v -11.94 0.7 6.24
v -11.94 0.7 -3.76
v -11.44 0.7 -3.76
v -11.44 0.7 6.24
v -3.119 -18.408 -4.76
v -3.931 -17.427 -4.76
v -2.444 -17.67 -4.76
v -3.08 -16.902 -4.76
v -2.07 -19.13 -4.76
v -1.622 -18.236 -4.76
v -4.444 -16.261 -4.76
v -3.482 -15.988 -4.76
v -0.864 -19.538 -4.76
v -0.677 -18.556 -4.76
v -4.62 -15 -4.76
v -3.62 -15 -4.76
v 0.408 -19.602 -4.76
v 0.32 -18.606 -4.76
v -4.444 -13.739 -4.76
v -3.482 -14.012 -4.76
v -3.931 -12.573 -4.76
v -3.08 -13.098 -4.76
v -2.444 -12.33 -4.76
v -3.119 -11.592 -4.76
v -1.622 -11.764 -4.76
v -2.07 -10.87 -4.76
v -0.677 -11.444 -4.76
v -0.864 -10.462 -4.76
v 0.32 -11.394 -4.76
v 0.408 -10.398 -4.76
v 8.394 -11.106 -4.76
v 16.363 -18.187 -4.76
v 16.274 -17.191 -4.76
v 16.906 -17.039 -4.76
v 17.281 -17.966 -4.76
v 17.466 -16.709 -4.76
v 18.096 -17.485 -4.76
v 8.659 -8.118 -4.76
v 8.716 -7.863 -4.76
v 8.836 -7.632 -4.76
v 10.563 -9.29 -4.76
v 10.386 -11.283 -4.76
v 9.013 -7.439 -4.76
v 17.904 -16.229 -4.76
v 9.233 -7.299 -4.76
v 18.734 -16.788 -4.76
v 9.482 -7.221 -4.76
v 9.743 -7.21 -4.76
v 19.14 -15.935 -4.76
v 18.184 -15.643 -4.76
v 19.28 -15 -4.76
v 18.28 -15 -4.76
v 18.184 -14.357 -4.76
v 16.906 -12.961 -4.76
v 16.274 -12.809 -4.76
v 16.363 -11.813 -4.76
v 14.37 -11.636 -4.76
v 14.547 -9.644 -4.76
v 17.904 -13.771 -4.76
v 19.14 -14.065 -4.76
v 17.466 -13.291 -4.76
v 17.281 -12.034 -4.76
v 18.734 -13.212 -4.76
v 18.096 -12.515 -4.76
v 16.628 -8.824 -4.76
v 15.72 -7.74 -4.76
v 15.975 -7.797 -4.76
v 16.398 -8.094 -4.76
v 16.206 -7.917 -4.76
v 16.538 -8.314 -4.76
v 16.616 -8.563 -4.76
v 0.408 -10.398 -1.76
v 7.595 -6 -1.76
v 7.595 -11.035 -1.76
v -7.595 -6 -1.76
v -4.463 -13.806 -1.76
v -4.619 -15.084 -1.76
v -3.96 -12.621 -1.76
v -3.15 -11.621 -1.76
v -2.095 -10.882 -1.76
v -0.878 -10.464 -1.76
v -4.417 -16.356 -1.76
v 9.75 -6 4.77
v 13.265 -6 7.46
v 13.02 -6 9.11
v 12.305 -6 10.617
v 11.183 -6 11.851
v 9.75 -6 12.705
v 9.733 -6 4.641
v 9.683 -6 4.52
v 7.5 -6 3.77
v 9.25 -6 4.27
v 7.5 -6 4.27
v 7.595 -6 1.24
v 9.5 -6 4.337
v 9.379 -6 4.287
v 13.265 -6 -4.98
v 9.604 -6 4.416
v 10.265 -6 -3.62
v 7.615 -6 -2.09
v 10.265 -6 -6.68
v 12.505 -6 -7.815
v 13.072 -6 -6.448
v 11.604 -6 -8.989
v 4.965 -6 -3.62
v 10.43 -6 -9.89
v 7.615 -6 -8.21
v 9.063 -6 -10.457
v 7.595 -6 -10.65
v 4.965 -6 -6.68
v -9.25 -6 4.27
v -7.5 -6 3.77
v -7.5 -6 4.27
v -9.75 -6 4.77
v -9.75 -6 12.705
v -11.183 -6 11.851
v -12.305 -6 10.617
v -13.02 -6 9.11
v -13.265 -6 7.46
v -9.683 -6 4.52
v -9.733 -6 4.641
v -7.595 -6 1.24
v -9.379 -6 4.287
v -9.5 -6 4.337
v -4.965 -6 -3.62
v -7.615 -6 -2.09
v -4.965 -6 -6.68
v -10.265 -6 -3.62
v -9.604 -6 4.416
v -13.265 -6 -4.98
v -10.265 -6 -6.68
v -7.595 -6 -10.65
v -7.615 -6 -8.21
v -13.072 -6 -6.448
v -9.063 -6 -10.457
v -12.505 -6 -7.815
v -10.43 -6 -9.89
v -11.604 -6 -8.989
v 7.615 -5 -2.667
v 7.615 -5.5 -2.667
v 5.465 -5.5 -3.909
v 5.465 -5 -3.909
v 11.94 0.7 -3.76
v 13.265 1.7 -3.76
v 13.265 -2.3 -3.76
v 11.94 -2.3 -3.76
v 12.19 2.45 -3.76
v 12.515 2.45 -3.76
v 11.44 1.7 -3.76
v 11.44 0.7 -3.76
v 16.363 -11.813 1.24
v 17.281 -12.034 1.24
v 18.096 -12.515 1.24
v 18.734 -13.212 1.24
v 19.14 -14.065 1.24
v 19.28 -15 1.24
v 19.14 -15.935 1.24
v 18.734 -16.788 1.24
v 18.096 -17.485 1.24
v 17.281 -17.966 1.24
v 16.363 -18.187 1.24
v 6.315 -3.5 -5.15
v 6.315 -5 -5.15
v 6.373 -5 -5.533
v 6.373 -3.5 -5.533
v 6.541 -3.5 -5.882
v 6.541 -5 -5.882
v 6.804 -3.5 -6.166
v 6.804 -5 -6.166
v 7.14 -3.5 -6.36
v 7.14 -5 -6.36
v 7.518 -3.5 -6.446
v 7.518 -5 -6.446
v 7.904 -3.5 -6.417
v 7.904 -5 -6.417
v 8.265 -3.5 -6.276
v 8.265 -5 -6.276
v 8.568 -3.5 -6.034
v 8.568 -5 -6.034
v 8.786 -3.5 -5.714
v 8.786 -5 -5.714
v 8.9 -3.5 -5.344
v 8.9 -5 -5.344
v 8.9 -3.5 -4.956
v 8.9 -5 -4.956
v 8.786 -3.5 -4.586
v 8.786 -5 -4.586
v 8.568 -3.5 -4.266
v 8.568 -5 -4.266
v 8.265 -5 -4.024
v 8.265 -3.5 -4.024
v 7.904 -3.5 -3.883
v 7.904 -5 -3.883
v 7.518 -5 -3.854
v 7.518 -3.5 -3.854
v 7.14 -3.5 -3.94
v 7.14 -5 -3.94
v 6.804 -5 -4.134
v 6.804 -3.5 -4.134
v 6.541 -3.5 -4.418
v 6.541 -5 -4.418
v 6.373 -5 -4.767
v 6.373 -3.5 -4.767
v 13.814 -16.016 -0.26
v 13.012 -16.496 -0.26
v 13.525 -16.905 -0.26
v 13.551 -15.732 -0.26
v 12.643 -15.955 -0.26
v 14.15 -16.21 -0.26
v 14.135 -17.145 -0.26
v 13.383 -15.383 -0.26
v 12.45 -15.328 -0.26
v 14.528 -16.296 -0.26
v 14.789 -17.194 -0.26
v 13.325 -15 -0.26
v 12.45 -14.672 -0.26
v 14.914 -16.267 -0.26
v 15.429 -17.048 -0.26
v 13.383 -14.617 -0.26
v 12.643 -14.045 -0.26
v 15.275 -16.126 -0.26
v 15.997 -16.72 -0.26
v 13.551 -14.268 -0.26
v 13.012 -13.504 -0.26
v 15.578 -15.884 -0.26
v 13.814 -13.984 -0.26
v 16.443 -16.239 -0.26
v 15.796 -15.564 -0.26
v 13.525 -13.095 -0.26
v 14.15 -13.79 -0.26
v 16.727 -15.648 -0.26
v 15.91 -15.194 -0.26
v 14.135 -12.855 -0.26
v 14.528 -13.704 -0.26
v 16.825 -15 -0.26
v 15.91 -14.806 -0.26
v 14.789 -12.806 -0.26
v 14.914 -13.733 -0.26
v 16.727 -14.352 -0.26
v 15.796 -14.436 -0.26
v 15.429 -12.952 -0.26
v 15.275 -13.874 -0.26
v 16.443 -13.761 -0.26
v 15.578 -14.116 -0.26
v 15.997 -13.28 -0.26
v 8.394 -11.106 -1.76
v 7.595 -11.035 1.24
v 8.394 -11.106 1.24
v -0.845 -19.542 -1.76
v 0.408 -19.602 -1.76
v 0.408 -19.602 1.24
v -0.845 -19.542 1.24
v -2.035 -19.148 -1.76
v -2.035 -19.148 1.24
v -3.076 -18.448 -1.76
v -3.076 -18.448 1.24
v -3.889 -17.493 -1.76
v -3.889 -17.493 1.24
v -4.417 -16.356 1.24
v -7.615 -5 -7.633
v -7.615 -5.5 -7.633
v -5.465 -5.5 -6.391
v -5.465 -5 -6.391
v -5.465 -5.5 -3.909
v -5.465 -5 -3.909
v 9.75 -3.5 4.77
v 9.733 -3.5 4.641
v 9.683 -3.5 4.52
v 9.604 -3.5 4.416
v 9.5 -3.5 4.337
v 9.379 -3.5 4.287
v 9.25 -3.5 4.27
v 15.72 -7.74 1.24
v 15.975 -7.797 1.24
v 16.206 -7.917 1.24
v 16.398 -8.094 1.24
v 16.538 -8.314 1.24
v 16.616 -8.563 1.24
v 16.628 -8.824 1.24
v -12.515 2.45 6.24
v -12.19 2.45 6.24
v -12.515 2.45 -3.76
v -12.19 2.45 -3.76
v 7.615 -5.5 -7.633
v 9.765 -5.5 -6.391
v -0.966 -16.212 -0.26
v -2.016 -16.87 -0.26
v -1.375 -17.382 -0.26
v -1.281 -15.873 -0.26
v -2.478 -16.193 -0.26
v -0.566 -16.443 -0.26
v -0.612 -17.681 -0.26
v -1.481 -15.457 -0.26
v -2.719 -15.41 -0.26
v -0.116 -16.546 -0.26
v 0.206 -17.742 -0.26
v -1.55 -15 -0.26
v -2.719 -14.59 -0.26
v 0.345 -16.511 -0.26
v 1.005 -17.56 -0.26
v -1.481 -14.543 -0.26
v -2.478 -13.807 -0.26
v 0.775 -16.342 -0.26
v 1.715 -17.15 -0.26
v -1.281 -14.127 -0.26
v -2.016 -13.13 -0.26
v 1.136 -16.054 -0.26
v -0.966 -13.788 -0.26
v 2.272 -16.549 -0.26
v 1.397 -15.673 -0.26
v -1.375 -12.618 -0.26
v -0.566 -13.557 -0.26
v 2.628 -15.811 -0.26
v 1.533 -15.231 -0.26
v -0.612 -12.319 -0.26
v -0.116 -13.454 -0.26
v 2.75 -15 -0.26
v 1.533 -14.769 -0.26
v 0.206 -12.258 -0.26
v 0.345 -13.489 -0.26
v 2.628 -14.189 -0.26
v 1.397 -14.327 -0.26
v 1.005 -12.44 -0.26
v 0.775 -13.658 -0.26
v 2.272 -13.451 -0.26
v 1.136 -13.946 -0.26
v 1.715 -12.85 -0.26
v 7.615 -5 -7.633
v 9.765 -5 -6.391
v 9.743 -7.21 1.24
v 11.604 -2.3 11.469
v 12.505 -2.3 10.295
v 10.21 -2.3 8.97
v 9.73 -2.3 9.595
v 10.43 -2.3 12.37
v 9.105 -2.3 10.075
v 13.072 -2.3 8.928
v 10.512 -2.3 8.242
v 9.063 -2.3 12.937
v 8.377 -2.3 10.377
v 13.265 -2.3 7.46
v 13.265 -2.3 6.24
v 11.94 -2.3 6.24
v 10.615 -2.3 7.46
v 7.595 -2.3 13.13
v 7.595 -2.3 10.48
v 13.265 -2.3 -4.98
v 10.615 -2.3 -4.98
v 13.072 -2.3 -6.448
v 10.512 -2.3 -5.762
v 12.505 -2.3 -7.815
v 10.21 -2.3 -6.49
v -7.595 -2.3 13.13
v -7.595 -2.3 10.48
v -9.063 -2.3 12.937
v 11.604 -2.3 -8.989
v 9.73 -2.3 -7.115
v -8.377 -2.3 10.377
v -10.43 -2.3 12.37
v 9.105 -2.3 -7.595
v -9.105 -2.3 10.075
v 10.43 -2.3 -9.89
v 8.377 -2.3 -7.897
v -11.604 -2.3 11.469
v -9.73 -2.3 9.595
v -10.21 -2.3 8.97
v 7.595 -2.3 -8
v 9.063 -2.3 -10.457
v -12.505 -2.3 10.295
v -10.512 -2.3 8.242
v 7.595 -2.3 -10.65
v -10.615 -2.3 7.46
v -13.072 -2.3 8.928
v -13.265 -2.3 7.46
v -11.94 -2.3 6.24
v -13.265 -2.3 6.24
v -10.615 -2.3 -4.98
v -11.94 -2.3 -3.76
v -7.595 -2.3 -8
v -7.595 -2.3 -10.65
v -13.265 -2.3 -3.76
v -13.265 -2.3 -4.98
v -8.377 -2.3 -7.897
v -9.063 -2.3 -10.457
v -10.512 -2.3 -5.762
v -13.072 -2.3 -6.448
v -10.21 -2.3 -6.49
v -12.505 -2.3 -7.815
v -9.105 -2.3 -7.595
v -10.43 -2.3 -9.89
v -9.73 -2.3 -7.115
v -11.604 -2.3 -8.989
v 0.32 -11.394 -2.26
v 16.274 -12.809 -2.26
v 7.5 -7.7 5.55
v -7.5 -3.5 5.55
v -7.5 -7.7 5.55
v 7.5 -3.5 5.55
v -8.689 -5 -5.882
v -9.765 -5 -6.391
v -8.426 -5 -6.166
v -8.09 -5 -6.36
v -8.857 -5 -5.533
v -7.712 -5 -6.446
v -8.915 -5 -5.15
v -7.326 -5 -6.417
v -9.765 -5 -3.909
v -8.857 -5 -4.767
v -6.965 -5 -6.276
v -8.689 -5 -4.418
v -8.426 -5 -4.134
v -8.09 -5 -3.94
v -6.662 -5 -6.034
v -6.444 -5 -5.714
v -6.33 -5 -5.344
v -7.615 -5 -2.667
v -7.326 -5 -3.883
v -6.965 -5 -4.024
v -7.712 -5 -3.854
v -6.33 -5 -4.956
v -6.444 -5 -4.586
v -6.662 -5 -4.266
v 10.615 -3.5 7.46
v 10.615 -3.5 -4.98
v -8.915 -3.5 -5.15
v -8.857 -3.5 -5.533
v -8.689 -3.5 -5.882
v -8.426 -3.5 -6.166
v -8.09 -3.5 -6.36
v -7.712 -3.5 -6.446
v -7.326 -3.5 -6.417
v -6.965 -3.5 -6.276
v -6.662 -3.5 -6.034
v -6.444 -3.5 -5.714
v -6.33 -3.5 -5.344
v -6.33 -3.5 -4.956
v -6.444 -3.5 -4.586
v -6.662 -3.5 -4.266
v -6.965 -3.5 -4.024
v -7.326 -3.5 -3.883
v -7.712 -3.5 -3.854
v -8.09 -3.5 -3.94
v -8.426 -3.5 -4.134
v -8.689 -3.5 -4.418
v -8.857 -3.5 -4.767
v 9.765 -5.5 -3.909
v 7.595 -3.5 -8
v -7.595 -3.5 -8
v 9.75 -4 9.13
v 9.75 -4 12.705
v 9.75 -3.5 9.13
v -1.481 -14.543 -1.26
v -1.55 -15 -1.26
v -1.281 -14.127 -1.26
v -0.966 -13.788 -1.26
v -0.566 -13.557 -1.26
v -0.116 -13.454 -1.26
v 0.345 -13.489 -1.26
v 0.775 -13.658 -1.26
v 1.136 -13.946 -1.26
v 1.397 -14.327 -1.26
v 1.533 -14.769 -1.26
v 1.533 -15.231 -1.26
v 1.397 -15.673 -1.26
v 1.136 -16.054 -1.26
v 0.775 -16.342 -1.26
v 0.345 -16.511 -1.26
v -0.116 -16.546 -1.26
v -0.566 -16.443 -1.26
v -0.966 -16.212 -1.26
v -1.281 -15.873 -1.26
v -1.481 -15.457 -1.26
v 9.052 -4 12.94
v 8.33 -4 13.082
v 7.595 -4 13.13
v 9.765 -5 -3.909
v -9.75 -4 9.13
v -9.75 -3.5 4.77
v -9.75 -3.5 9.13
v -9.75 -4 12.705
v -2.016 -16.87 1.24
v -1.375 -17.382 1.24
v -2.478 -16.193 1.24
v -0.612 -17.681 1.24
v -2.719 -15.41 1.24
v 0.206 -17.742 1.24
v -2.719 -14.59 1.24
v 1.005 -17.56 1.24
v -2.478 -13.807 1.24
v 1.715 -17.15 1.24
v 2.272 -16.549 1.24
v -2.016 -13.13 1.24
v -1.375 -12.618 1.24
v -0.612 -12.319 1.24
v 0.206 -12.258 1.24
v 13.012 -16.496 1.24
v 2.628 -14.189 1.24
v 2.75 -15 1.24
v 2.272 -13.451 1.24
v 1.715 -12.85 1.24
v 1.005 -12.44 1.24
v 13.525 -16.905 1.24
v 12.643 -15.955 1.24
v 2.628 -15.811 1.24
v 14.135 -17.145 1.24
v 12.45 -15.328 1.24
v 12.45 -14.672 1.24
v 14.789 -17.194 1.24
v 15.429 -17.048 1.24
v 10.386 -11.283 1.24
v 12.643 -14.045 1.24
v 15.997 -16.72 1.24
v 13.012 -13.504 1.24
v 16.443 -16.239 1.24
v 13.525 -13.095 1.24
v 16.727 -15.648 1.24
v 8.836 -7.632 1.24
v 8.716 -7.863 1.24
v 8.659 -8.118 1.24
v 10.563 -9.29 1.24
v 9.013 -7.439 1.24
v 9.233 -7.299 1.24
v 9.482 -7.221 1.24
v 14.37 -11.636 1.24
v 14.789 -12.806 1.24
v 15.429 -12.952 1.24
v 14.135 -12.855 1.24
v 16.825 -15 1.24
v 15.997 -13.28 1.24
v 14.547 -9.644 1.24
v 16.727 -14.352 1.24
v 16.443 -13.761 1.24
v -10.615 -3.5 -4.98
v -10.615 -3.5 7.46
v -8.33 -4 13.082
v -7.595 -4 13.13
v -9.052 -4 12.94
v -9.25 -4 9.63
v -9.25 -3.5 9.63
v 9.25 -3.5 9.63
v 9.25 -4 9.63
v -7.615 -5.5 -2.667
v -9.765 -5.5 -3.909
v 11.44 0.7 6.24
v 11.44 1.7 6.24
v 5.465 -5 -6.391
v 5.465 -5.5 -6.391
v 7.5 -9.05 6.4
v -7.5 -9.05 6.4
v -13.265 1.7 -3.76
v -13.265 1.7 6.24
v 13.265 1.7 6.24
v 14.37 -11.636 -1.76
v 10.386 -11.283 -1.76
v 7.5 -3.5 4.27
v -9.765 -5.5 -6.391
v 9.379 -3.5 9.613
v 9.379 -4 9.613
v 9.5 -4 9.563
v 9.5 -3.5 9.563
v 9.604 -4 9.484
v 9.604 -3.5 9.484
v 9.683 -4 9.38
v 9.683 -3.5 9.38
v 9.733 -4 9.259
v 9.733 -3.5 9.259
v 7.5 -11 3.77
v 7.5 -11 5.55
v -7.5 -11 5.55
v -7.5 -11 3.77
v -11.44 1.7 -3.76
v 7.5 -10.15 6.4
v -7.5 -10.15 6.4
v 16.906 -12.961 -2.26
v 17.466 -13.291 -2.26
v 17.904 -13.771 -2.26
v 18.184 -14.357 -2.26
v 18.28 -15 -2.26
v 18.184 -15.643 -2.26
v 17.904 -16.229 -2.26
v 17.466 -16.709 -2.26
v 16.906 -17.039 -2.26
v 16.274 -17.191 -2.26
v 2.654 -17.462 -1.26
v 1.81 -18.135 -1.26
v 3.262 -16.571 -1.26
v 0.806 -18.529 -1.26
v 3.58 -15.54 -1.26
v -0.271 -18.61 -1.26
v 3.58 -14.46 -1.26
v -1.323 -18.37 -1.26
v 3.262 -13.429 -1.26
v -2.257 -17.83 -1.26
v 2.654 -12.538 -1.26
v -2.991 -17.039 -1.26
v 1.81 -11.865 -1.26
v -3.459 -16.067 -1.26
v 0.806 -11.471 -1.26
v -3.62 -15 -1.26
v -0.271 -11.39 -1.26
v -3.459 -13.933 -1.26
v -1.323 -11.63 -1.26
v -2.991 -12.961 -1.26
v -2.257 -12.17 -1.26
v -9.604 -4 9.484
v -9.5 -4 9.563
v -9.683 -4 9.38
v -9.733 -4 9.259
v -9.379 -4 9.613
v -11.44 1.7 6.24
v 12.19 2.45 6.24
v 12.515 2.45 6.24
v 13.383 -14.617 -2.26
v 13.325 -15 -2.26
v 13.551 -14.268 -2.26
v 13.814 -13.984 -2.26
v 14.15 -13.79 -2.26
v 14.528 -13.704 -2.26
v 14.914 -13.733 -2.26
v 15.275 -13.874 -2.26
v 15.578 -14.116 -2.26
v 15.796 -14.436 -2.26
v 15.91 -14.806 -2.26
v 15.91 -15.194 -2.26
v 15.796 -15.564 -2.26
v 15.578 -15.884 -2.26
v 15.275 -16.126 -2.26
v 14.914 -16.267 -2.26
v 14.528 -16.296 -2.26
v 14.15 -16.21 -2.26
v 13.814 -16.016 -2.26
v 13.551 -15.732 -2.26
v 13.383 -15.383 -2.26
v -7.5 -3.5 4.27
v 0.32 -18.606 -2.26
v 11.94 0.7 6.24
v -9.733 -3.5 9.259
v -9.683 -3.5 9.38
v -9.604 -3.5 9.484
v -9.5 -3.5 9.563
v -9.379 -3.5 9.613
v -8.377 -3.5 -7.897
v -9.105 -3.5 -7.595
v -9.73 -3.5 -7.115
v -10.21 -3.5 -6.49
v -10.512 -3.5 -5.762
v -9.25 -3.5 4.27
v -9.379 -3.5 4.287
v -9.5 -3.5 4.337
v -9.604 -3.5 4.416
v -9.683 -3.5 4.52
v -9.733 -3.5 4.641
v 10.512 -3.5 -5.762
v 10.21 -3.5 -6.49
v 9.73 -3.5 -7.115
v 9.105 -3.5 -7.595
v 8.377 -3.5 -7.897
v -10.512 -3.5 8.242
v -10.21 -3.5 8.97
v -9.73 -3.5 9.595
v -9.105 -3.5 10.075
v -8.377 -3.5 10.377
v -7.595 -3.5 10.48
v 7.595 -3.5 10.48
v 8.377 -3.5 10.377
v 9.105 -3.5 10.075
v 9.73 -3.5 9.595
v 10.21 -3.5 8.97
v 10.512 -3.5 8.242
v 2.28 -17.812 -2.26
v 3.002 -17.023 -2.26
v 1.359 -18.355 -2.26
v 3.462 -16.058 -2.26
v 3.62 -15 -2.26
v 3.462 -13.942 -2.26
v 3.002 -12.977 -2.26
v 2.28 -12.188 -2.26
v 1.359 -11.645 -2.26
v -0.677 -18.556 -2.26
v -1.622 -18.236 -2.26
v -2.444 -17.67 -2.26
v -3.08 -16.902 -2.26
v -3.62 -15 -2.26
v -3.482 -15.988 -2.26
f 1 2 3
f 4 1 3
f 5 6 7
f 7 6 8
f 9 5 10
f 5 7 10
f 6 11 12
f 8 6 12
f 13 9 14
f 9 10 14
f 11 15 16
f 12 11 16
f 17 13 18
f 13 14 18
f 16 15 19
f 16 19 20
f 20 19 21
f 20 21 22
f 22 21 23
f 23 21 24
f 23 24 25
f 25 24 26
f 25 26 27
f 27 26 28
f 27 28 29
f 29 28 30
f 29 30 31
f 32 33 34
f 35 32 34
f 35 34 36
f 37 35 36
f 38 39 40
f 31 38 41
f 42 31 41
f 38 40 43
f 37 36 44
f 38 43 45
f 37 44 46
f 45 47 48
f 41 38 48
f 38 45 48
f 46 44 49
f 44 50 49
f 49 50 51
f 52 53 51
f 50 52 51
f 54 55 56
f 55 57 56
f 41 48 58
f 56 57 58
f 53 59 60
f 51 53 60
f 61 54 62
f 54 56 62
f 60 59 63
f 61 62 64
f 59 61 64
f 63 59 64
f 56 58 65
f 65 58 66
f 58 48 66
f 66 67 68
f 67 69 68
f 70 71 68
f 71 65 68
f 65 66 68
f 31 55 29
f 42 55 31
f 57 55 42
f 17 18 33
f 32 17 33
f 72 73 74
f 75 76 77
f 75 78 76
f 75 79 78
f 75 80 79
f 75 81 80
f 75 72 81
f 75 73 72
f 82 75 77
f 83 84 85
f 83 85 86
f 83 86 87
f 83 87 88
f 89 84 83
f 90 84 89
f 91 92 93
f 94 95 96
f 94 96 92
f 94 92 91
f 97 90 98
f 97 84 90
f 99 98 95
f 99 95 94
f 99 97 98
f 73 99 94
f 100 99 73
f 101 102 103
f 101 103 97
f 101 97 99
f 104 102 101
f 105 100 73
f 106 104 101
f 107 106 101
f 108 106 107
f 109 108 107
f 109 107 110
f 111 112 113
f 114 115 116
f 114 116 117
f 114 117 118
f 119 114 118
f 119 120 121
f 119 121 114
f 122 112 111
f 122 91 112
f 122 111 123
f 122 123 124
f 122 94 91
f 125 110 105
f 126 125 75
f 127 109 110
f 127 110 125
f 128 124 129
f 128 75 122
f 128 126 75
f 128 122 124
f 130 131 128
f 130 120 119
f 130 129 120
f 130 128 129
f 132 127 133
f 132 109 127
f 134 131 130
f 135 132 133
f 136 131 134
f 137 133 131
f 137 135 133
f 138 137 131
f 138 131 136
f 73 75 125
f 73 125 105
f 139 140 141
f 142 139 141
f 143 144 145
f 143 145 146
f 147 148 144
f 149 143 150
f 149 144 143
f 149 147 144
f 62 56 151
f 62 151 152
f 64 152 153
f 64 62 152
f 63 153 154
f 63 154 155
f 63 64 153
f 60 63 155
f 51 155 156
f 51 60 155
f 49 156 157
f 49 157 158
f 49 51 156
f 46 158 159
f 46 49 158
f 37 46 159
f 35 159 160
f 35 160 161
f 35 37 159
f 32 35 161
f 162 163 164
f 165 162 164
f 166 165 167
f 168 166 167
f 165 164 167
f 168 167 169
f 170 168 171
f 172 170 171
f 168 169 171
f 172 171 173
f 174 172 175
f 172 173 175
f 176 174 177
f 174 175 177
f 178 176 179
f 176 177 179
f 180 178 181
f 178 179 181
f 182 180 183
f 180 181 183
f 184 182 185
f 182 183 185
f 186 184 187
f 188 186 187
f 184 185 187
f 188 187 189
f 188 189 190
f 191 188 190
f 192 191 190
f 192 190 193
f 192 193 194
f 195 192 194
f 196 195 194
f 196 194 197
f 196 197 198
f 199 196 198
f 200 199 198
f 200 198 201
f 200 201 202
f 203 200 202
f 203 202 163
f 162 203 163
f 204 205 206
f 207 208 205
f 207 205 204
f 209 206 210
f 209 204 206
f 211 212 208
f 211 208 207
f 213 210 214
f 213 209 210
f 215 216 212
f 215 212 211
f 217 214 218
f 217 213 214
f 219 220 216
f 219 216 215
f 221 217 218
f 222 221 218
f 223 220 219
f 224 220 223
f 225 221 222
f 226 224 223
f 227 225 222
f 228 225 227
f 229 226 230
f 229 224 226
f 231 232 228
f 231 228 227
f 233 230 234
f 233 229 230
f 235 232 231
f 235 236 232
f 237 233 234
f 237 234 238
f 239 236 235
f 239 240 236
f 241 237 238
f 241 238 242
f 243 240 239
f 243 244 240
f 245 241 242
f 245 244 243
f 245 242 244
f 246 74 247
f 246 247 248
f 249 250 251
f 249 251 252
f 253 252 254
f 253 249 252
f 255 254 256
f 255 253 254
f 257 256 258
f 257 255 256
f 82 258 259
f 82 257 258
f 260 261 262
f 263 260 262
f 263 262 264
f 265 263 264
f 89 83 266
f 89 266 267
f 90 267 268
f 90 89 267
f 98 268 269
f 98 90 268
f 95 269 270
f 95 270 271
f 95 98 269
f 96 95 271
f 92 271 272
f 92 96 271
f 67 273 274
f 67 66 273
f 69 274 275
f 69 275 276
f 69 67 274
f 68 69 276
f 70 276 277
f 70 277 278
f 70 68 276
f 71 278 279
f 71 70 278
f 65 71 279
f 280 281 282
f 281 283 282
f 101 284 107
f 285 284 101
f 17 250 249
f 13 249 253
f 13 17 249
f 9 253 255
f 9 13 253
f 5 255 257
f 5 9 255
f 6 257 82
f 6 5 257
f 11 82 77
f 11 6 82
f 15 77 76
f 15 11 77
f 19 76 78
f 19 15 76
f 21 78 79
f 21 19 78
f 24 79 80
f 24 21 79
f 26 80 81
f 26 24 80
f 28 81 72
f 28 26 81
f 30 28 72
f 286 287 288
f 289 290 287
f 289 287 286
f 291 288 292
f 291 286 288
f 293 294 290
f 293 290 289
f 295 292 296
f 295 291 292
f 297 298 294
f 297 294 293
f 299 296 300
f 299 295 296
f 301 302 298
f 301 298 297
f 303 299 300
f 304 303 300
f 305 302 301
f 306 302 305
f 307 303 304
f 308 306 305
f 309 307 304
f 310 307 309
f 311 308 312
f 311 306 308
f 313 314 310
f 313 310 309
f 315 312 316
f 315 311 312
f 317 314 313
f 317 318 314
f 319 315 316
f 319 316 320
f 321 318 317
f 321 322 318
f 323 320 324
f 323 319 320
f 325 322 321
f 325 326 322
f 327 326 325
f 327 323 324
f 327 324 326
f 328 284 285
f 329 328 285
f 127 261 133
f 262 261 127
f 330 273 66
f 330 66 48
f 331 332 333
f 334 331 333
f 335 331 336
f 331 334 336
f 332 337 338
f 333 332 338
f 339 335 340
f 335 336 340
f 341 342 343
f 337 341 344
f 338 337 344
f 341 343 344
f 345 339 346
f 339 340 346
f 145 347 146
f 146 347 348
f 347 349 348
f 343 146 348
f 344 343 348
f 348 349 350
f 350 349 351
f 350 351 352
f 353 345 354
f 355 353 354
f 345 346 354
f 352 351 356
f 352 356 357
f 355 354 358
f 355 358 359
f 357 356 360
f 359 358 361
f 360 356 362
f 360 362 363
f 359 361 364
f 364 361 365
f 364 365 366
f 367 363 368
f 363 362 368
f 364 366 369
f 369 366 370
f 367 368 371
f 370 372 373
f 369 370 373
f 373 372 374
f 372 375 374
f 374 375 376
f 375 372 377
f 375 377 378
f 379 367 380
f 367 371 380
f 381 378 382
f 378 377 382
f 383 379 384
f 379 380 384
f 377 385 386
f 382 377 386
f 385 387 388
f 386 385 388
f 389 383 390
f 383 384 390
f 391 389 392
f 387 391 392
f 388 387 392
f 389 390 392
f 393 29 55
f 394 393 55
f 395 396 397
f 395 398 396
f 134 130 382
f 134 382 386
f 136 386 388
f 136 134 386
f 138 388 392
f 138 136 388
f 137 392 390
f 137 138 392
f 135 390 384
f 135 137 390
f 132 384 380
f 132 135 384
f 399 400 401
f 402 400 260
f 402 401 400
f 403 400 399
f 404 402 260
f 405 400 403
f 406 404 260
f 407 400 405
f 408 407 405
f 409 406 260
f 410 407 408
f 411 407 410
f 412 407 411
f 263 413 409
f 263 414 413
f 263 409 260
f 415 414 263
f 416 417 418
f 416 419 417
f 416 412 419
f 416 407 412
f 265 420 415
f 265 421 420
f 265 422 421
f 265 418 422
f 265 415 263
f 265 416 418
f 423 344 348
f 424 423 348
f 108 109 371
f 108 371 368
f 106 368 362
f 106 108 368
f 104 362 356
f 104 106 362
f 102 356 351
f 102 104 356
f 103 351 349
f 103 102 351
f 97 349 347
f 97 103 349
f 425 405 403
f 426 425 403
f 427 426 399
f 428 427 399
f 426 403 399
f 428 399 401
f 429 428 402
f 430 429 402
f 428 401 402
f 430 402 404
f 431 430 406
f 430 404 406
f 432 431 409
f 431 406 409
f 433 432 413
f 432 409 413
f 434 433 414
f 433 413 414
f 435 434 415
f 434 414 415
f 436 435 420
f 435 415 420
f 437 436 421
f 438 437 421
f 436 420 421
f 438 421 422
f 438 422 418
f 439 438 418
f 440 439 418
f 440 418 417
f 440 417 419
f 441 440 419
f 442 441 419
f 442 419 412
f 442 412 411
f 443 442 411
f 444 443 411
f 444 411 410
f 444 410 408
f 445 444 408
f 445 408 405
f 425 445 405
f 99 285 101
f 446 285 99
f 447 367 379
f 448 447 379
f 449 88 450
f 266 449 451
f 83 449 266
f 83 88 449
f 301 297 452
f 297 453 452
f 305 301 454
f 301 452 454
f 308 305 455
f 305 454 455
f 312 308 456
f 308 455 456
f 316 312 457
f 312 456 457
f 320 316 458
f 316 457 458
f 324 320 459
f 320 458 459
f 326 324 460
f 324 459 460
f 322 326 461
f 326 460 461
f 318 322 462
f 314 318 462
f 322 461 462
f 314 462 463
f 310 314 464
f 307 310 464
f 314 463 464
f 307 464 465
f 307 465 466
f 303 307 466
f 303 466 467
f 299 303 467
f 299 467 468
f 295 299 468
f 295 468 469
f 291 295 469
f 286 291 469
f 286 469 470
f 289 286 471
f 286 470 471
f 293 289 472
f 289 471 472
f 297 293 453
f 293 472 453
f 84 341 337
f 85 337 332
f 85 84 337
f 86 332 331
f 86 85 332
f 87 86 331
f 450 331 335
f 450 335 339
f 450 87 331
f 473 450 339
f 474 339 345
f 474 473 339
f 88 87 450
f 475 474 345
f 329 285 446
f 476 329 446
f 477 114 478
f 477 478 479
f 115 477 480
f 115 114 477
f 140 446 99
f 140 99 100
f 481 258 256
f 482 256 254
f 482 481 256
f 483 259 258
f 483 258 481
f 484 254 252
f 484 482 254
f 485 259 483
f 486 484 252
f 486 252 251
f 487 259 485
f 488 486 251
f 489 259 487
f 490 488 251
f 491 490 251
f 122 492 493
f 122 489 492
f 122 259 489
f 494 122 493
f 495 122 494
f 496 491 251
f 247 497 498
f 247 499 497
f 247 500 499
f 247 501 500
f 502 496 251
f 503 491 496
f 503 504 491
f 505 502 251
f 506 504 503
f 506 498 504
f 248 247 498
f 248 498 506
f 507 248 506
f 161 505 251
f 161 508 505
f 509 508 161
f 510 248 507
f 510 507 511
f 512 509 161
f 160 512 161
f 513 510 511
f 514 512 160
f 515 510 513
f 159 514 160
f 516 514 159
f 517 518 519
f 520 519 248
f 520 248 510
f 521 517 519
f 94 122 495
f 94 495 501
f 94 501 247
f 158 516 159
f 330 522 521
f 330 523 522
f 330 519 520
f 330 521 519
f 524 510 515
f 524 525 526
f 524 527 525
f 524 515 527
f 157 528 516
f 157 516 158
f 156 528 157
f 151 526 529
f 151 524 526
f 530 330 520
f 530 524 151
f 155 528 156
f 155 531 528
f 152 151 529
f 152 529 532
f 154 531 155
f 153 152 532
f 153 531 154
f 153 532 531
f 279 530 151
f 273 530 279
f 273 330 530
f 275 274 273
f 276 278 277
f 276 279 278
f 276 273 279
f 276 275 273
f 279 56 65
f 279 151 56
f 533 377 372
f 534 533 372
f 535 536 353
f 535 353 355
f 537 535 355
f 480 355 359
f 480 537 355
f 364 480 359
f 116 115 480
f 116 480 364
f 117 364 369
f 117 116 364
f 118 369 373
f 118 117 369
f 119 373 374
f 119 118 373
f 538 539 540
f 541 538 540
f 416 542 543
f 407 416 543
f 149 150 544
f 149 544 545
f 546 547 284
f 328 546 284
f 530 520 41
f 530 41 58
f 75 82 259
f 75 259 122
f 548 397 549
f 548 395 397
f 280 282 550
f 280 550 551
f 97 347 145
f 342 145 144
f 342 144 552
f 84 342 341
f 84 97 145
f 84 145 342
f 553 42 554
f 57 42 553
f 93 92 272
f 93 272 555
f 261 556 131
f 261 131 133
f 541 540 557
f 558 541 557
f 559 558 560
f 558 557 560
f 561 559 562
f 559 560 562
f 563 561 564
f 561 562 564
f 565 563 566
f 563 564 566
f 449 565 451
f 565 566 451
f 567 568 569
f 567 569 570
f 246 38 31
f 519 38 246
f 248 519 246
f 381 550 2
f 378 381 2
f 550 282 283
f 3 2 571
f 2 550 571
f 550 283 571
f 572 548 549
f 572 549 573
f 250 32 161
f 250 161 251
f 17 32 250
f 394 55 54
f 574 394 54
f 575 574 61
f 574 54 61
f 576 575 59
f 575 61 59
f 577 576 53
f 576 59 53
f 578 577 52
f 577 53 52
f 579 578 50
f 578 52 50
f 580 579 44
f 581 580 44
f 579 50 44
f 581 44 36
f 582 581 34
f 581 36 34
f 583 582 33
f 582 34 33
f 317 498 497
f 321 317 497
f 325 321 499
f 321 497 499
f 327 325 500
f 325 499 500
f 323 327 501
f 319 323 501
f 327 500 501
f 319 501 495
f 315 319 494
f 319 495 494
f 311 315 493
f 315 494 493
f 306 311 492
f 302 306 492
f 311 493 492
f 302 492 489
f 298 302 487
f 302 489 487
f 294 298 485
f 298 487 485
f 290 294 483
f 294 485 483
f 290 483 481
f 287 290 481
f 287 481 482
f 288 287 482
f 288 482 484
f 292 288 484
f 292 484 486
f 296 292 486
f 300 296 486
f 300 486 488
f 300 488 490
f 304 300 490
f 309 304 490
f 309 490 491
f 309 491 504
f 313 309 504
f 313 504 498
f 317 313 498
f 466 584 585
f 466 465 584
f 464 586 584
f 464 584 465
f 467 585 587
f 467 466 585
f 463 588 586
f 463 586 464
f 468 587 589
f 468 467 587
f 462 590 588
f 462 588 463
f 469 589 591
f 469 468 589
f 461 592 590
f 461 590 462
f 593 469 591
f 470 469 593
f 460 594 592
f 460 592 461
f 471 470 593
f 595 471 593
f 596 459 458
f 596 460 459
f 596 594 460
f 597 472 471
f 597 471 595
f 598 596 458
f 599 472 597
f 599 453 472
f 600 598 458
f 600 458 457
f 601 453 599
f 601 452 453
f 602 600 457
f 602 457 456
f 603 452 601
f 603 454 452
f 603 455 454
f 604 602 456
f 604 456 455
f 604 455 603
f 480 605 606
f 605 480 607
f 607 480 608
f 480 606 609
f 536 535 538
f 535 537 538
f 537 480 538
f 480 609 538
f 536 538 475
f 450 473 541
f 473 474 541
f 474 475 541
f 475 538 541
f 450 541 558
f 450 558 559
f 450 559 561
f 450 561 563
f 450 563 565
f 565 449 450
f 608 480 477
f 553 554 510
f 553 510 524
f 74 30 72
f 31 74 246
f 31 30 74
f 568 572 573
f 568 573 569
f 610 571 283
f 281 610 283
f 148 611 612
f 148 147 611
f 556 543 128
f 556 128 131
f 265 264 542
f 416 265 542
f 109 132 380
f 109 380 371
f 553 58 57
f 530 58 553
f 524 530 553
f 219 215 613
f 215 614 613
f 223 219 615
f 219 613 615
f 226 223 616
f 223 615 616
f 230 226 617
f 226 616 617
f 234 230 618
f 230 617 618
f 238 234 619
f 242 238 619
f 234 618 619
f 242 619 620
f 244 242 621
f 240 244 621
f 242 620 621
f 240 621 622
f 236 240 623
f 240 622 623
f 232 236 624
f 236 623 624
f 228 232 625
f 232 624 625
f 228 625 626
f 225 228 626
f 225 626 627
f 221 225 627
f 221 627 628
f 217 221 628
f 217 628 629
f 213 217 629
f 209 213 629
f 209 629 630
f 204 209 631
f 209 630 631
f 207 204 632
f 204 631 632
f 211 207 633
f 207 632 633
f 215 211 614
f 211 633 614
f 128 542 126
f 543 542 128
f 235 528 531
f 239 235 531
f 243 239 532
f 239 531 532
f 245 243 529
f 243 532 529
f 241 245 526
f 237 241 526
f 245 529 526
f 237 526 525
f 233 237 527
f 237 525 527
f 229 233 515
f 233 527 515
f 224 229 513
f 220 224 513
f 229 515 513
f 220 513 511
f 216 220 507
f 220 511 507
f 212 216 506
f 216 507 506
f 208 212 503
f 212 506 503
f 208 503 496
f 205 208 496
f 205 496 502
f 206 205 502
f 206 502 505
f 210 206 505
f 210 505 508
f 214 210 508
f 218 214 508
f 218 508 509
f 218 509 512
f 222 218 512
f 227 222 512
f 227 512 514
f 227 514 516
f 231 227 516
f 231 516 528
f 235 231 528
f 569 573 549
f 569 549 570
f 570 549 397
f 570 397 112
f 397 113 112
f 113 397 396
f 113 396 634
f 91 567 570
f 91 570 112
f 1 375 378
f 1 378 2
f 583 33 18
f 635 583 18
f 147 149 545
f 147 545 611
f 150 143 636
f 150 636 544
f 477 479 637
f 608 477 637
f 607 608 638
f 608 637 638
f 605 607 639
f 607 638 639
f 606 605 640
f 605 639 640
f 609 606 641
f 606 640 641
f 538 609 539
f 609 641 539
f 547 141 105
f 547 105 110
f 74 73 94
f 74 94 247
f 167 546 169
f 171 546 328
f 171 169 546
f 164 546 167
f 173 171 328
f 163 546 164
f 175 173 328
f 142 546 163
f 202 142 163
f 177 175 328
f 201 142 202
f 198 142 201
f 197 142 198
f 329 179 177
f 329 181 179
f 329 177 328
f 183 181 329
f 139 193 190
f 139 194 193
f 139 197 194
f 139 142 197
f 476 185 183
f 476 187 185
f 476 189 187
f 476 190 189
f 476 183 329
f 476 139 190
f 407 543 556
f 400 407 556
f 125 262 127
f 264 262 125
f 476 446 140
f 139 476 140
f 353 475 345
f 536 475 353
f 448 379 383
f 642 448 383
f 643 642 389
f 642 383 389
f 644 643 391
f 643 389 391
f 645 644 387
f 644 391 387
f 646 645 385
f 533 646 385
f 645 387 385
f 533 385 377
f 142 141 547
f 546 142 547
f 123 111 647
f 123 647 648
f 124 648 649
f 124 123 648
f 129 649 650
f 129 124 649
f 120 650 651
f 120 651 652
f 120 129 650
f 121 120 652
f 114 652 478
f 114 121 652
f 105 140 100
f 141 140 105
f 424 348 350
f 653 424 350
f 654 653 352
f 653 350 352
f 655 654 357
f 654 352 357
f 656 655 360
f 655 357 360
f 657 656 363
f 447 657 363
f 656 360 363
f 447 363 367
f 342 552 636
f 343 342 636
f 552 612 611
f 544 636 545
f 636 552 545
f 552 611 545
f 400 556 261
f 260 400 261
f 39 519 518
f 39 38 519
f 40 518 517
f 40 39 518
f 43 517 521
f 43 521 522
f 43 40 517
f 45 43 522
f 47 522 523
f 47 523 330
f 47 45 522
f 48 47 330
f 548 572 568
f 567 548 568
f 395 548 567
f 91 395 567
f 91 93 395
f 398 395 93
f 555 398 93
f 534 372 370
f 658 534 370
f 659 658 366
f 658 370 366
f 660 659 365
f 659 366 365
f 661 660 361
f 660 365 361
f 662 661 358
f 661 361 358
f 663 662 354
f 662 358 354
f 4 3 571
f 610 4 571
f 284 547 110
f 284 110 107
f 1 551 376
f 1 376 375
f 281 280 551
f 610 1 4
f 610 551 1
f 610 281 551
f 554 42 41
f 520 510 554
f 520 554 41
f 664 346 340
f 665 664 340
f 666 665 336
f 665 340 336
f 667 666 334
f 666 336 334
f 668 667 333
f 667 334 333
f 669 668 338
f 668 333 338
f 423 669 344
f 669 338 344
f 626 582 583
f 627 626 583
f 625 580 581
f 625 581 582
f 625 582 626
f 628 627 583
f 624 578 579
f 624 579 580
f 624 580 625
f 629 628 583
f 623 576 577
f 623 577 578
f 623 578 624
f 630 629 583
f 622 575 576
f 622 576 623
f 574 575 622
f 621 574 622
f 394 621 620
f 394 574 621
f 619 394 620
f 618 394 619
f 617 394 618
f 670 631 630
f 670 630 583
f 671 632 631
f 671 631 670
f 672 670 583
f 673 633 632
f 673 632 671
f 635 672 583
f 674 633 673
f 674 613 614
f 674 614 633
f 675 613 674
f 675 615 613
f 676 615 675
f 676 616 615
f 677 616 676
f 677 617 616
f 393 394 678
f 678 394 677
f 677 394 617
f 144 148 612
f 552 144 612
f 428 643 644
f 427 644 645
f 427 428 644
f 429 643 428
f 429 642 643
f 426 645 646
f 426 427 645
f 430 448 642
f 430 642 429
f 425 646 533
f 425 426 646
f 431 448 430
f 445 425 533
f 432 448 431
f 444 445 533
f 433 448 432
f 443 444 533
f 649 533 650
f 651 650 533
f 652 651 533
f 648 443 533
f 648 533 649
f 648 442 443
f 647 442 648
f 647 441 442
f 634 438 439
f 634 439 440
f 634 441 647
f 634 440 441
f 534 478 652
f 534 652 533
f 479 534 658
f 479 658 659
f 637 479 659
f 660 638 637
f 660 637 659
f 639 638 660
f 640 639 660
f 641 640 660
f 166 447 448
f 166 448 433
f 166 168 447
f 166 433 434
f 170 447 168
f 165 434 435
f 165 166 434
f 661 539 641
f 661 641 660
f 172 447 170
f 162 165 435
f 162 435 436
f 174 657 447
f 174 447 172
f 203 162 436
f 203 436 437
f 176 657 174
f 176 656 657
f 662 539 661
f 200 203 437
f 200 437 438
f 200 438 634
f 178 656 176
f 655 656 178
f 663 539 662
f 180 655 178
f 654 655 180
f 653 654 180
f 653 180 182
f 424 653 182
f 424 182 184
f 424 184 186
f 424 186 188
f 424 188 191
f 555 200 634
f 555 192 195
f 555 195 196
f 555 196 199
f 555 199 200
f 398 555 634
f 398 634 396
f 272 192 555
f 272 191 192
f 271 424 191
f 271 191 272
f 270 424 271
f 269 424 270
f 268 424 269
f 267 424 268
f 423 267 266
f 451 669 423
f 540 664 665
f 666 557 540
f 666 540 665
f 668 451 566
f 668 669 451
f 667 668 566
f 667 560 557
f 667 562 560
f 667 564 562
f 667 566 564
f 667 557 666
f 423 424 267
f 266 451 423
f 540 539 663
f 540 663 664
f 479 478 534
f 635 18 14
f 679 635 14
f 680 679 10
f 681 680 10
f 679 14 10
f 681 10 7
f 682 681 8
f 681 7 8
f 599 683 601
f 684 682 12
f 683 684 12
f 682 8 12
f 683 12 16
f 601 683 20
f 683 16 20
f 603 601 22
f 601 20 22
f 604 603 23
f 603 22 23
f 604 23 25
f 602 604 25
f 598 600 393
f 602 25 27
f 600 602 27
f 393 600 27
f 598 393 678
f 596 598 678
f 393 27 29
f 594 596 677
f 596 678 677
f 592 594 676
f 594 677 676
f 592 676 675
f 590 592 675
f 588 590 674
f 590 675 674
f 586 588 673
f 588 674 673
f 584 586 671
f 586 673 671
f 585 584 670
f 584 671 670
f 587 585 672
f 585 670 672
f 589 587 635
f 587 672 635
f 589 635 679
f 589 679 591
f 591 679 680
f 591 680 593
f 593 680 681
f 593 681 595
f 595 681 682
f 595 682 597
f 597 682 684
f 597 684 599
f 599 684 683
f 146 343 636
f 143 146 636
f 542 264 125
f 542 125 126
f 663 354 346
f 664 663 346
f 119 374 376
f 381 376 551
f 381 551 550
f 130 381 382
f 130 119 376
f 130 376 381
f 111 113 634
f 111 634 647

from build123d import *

# Parameters (mm, degrees)
BOSS_EXTRUDE1_DEPTH              = 3.7
CUT_EXTRUDE1_DEPTH               = 1.2
CUT_EXTRUDE2_DEPTH               = 2
CUT_EXTRUDE3_DEPTH               = 20.027535968
BOSS_EXTRUDE3_DEPTH              = 5
M2_CLEARANCE_HOLE1_D             = 2.6
CUT_EXTRUDE4_DEPTH               = 1
CHAMFER2_SIZE                    = 0.75
BOSS_EXTRUDE4_DEPTH              = 3
BOSS_EXTRUDE5_START              = 3
BOSS_EXTRUDE5_DEPTH              = 3
CBORE_FOR_M2_5_SHCS1_D           = 3.1
CBORE_FOR_M2_5_SHCS1_CBORE_D     = 5.5
CBORE_FOR_M2_5_SHCS1_CBORE_DEPTH = 1.5
CUT_EXTRUDE6_DEPTH               = 2.5
SKETCH18_R                       = 3.62
CUT_EXTRUDE7_DEPTH               = 1
CBORE_FOR_M2_SHCS1_D             = 2.6
CBORE_FOR_M2_SHCS1_CBORE_D       = 4.4
CBORE_FOR_M2_SHCS1_CBORE_DEPTH   = 1.5
CHAMFER3_SIZE                    = 0.5
BOSS_EXTRUDE8_DEPTH              = 7.5
BOSS_EXTRUDE9_DEPTH              = 6
FILLET1_R                        = 1


with BuildPart() as part:
    # Sketch1 → Boss-Extrude1 (new body)
    with BuildSketch(Plane(origin=(0, -6, 0), x_dir=(-1, 0, 0), z_dir=(0, -1, 0))):
        with BuildLine():
            Line((7.595, 10.65), (-7.595, 10.65))
            ThreePointArc((-7.595, 10.65), (-11.604295449, 8.989295449), (-13.265, 4.98))
            Line((-13.265, 4.98), (-13.265, -7.46))
            ThreePointArc((-13.265, -7.46), (-11.604295449, -11.469295449), (-7.595, -13.13))
            Line((-7.595, -13.13), (7.595, -13.13))
            ThreePointArc((7.595, -13.13), (11.604295449, -11.469295449), (13.265, -7.46))
            Line((13.265, -7.46), (13.265, 4.98))
            ThreePointArc((13.265, 4.98), (11.604295449, 8.989295449), (7.595, 10.65))
        make_face()
    extrude(amount=-BOSS_EXTRUDE1_DEPTH)

    # Sketch3 → Cut-Extrude1 (cut)
    with BuildSketch(Plane(origin=(0, -2.3, 0), x_dir=(1, 0, 0), z_dir=(0, 1, 0))):
        with BuildLine():
            Line((-7.595, -10.48), (7.595, -10.48))
            ThreePointArc((7.595, -10.48), (9.730462479, -9.595462479), (10.615, -7.46))
            Line((10.615, -7.46), (10.615, 4.98))
            ThreePointArc((10.615, 4.98), (9.730462479, 7.115462479), (7.595, 8))
            Line((7.595, 8), (-7.595, 8))
            ThreePointArc((-7.595, 8), (-9.730462479, 7.115462479), (-10.615, 4.98))
            Line((-10.615, 4.98), (-10.615, -7.46))
            ThreePointArc((-10.615, -7.46), (-9.730462479, -9.595462479), (-7.595, -10.48))
        make_face()
    extrude(amount=-CUT_EXTRUDE1_DEPTH, mode=Mode.SUBTRACT)

    # Sketch4 → Cut-Extrude2 (cut)
    with BuildSketch(Plane(origin=(0, -6, 0), x_dir=(1, 0, 0), z_dir=(0, 1, 0))):
        with BuildLine():
            Line((9.25, -4.27), (-9.25, -4.27))
            ThreePointArc((-9.25, -4.27), (-9.603553391, -4.416446609), (-9.75, -4.77))
            Line((-9.75, -4.77), (-9.75, -11.98))
            Line((-9.75, -11.98), (-9.75, -13.13))
            Line((-9.75, -13.13), (9.75, -13.13))
            Line((9.75, -13.13), (9.75, -11.98))
            Line((9.75, -11.98), (9.75, -4.77))
            ThreePointArc((9.75, -4.77), (9.603553391, -4.416446609), (9.25, -4.27))
        make_face()
    extrude(amount=CUT_EXTRUDE2_DEPTH, mode=Mode.SUBTRACT)

    # Sketch5 → Cut-Extrude3 (cut, through all)
    with BuildSketch(Plane(origin=(0, -2.3, 0), x_dir=(1, 0, 0), z_dir=(0, 1, 0))):
        with BuildLine():
            Line((-9.25, -9.63), (9.25, -9.63))
            ThreePointArc((9.25, -9.63), (9.603553391, -9.483553391), (9.75, -9.13))
            Line((9.75, -9.13), (9.75, -4.77))
            ThreePointArc((9.75, -4.77), (9.603553391, -4.416446609), (9.25, -4.27))
            Line((9.25, -4.27), (-9.25, -4.27))
            ThreePointArc((-9.25, -4.27), (-9.603553391, -4.416446609), (-9.75, -4.77))
            Line((-9.75, -4.77), (-9.75, -9.13))
            ThreePointArc((-9.75, -9.13), (-9.603553391, -9.483553391), (-9.25, -9.63))
        make_face()
    extrude(amount=-CUT_EXTRUDE3_DEPTH, mode=Mode.SUBTRACT)

    # Sketch6 → Boss-Extrude3 (add, symmetric)
    with BuildSketch(Plane(origin=(0, 0, 1.24), x_dir=(-1, 0, 0), z_dir=(0, 0, -1))):
        Polygon((-11.94, -2.3), (-11.94, 0.7), (-11.44, 0.7), (-11.44, 1.7), (-12.19, 2.45), (-13.265, 2.45), (-13.265, -2.3), align=None)
    boss_extrude3 = extrude(amount=BOSS_EXTRUDE3_DEPTH, both=True)

    # Mirror1: Boss-Extrude3 across plane
    add(boss_extrude3.mirror(Plane(origin=(0, 0, 0), x_dir=(0, 0, 1), z_dir=(1, 0, 0))))

    # M2 Clearance Hole1 (through all)
    with Locations(Plane(origin=(0, -3.5, 0), x_dir=(1, 0, 0), z_dir=(0, 1, 0))):
        with Locations((-7.615, 5.15), (7.615, 5.15)):
            Hole(M2_CLEARANCE_HOLE1_D / 2)

    # Sketch9 → Cut-Extrude4 (cut)
    with BuildSketch(Plane.XZ.offset(6)):
        Polygon((-7.615, -2.667393842), (-9.765, -3.908696921), (-9.765, -6.391303079), (-7.615, -7.632606158), (-5.465, -6.391303079), (-5.465, -3.908696921), align=None)
        Polygon((7.615, -2.667393842), (5.465, -3.908696921), (5.465, -6.391303079), (7.615, -7.632606158), (9.765, -6.391303079), (9.765, -3.908696921), align=None)
    extrude(amount=-CUT_EXTRUDE4_DEPTH, mode=Mode.SUBTRACT)

    # Chamfer2
    chamfer2_edges = [part.edges().sort_by_distance(p)[0] for p in [
        (-13.265, 2.45, 1.24),
        (13.265, 2.45, 1.24),
    ]]
    chamfer(chamfer2_edges, length=CHAMFER2_SIZE)

    # Sketch11 → Boss-Extrude4 (add)
    with BuildSketch(Plane(origin=(0, 0, -1.76), x_dir=(-1, 0, 0), z_dir=(0, 0, -1))):
        with BuildLine():
            Line((-16.362587065, -18.187498165), (-0.407985075, -19.601950475))
            ThreePointArc((-0.407985075, -19.601950475), (2.579168763, -18.833052112), (4.416654929, -16.355566021))
            Line((4.416654929, -16.355566021), (7.595, -6))
            Line((7.595, -6), (7.595, -3.5))
            Line((7.595, -3.5), (-7.595, -3.5))
            Line((-7.595, -3.5), (-7.595, -11.035213013))
            Line((-7.595, -11.035213013), (-16.362587065, -11.812501835))
            ThreePointArc((-16.362587065, -11.812501835), (-19.28, -15), (-16.362587065, -18.187498165))
        make_face()
    extrude(amount=-BOSS_EXTRUDE4_DEPTH)

    # Sketch12 → Boss-Extrude5 (add)
    with BuildSketch(Plane(origin=(0, 0, -1.76), x_dir=(-1, 0, 0), z_dir=(0, 0, -1)).offset(BOSS_EXTRUDE5_START)):
        with BuildLine():
            Line((-0.407985075, -10.398049525), (-16.362587065, -11.812501835))
            ThreePointArc((-16.362587065, -11.812501835), (-19.28, -15), (-16.362587065, -18.187498165))
            Line((-16.362587065, -18.187498165), (-0.407985075, -19.601950475))
            ThreePointArc((-0.407985075, -19.601950475), (4.62, -15), (-0.407985075, -10.398049525))
        make_face()
    extrude(amount=-BOSS_EXTRUDE5_DEPTH)

    # CBORE for M2.5 SHCS1 (through all)
    with Locations(Plane.XY.offset(1.24)):
        with Locations((0, -15)):
            CounterBoreHole(CBORE_FOR_M2_5_SHCS1_D / 2, CBORE_FOR_M2_5_SHCS1_CBORE_D / 2, CBORE_FOR_M2_5_SHCS1_CBORE_DEPTH)

    # Sketch17 → Cut-Extrude6 (cut)
    with BuildSketch(Plane(origin=(0, 0, -4.76), x_dir=(-1, 0, 0), z_dir=(0, 0, -1))):
        with BuildLine():
            Line((-0.319676617, -11.394142701), (-16.274278607, -12.808595012))
            ThreePointArc((-16.274278607, -12.808595012), (-18.28, -15), (-16.274278607, -17.191404988))
            Line((-16.274278607, -17.191404988), (-0.319676617, -18.605857299))
            ThreePointArc((-0.319676617, -18.605857299), (3.62, -15), (-0.319676617, -11.394142701))
        make_face()
    extrude(amount=-CUT_EXTRUDE6_DEPTH, mode=Mode.SUBTRACT)

    # Sketch18 → Cut-Extrude7 (cut)
    with BuildSketch(Plane(origin=(0, 0, -2.26), x_dir=(-1, 0, 0), z_dir=(0, 0, -1))):
        with Locations((0, -15)):
            Circle(SKETCH18_R)
    extrude(amount=-CUT_EXTRUDE7_DEPTH, mode=Mode.SUBTRACT)

    # CBORE for M2 SHCS1 (through all)
    with Locations(Plane.XY.offset(1.24)):
        with Locations((14.625, -15)):
            CounterBoreHole(CBORE_FOR_M2_SHCS1_D / 2, CBORE_FOR_M2_SHCS1_CBORE_D / 2, CBORE_FOR_M2_SHCS1_CBORE_DEPTH)

    # Chamfer3
    chamfer3_edges = [part.edges().sort_by_distance(p)[0] for p in [
        (6.54, -6, -3.288045382),
        (8.69, -6, -3.288045382),
        (5.465, -6, -5.15),
        (9.765, -6, -5.15),
        (6.54, -6, -7.011954618),
        (8.69, -6, -7.011954618),
        (-8.69, -6, -3.288045382),
        (-6.54, -6, -3.288045382),
        (-9.765, -6, -5.15),
        (-5.465, -6, -5.15),
        (-8.69, -6, -7.011954618),
        (-6.54, -6, -7.011954618),
    ]]
    chamfer(chamfer3_edges, length=CHAMFER3_SIZE)

    # Sketch30 → Boss-Extrude8 (add, symmetric)
    with BuildSketch(Plane(origin=(0, 0, 0), x_dir=(0, 0, -1), z_dir=(1, 0, 0))):
        Polygon((-5.55, -7.7), (-6.4, -9.05), (-6.4, -10.15), (-5.55, -11), (-3.77, -11), (-3.77, -3.5), (-5.55, -3.5), align=None)
    extrude(amount=BOSS_EXTRUDE8_DEPTH, both=True)

    # Sketch31 → Boss-Extrude9 (add)
    with BuildSketch(Plane.XY.offset(1.24)):
        Polygon((8.393841653, -11.106034173), (10.386028006, -11.282651089), (10.562644921, -9.290464736), (14.547017627, -9.643698567), (14.370400712, -11.63588492), (16.362587065, -11.812501835), (16.715820896, -7.828129129), (8.747075483, -7.121661467), align=None)
    extrude(amount=-BOSS_EXTRUDE9_DEPTH)

    # Fillet1
    fillet1_edges = [part.edges().sort_by_distance(p)[0] for p in [
        (8.747075483, -7.121661467, -1.76),
        (16.715820896, -7.828129129, -1.76),
    ]]
    fillet(fillet1_edges, radius=FILLET1_R)


solid = part.part
